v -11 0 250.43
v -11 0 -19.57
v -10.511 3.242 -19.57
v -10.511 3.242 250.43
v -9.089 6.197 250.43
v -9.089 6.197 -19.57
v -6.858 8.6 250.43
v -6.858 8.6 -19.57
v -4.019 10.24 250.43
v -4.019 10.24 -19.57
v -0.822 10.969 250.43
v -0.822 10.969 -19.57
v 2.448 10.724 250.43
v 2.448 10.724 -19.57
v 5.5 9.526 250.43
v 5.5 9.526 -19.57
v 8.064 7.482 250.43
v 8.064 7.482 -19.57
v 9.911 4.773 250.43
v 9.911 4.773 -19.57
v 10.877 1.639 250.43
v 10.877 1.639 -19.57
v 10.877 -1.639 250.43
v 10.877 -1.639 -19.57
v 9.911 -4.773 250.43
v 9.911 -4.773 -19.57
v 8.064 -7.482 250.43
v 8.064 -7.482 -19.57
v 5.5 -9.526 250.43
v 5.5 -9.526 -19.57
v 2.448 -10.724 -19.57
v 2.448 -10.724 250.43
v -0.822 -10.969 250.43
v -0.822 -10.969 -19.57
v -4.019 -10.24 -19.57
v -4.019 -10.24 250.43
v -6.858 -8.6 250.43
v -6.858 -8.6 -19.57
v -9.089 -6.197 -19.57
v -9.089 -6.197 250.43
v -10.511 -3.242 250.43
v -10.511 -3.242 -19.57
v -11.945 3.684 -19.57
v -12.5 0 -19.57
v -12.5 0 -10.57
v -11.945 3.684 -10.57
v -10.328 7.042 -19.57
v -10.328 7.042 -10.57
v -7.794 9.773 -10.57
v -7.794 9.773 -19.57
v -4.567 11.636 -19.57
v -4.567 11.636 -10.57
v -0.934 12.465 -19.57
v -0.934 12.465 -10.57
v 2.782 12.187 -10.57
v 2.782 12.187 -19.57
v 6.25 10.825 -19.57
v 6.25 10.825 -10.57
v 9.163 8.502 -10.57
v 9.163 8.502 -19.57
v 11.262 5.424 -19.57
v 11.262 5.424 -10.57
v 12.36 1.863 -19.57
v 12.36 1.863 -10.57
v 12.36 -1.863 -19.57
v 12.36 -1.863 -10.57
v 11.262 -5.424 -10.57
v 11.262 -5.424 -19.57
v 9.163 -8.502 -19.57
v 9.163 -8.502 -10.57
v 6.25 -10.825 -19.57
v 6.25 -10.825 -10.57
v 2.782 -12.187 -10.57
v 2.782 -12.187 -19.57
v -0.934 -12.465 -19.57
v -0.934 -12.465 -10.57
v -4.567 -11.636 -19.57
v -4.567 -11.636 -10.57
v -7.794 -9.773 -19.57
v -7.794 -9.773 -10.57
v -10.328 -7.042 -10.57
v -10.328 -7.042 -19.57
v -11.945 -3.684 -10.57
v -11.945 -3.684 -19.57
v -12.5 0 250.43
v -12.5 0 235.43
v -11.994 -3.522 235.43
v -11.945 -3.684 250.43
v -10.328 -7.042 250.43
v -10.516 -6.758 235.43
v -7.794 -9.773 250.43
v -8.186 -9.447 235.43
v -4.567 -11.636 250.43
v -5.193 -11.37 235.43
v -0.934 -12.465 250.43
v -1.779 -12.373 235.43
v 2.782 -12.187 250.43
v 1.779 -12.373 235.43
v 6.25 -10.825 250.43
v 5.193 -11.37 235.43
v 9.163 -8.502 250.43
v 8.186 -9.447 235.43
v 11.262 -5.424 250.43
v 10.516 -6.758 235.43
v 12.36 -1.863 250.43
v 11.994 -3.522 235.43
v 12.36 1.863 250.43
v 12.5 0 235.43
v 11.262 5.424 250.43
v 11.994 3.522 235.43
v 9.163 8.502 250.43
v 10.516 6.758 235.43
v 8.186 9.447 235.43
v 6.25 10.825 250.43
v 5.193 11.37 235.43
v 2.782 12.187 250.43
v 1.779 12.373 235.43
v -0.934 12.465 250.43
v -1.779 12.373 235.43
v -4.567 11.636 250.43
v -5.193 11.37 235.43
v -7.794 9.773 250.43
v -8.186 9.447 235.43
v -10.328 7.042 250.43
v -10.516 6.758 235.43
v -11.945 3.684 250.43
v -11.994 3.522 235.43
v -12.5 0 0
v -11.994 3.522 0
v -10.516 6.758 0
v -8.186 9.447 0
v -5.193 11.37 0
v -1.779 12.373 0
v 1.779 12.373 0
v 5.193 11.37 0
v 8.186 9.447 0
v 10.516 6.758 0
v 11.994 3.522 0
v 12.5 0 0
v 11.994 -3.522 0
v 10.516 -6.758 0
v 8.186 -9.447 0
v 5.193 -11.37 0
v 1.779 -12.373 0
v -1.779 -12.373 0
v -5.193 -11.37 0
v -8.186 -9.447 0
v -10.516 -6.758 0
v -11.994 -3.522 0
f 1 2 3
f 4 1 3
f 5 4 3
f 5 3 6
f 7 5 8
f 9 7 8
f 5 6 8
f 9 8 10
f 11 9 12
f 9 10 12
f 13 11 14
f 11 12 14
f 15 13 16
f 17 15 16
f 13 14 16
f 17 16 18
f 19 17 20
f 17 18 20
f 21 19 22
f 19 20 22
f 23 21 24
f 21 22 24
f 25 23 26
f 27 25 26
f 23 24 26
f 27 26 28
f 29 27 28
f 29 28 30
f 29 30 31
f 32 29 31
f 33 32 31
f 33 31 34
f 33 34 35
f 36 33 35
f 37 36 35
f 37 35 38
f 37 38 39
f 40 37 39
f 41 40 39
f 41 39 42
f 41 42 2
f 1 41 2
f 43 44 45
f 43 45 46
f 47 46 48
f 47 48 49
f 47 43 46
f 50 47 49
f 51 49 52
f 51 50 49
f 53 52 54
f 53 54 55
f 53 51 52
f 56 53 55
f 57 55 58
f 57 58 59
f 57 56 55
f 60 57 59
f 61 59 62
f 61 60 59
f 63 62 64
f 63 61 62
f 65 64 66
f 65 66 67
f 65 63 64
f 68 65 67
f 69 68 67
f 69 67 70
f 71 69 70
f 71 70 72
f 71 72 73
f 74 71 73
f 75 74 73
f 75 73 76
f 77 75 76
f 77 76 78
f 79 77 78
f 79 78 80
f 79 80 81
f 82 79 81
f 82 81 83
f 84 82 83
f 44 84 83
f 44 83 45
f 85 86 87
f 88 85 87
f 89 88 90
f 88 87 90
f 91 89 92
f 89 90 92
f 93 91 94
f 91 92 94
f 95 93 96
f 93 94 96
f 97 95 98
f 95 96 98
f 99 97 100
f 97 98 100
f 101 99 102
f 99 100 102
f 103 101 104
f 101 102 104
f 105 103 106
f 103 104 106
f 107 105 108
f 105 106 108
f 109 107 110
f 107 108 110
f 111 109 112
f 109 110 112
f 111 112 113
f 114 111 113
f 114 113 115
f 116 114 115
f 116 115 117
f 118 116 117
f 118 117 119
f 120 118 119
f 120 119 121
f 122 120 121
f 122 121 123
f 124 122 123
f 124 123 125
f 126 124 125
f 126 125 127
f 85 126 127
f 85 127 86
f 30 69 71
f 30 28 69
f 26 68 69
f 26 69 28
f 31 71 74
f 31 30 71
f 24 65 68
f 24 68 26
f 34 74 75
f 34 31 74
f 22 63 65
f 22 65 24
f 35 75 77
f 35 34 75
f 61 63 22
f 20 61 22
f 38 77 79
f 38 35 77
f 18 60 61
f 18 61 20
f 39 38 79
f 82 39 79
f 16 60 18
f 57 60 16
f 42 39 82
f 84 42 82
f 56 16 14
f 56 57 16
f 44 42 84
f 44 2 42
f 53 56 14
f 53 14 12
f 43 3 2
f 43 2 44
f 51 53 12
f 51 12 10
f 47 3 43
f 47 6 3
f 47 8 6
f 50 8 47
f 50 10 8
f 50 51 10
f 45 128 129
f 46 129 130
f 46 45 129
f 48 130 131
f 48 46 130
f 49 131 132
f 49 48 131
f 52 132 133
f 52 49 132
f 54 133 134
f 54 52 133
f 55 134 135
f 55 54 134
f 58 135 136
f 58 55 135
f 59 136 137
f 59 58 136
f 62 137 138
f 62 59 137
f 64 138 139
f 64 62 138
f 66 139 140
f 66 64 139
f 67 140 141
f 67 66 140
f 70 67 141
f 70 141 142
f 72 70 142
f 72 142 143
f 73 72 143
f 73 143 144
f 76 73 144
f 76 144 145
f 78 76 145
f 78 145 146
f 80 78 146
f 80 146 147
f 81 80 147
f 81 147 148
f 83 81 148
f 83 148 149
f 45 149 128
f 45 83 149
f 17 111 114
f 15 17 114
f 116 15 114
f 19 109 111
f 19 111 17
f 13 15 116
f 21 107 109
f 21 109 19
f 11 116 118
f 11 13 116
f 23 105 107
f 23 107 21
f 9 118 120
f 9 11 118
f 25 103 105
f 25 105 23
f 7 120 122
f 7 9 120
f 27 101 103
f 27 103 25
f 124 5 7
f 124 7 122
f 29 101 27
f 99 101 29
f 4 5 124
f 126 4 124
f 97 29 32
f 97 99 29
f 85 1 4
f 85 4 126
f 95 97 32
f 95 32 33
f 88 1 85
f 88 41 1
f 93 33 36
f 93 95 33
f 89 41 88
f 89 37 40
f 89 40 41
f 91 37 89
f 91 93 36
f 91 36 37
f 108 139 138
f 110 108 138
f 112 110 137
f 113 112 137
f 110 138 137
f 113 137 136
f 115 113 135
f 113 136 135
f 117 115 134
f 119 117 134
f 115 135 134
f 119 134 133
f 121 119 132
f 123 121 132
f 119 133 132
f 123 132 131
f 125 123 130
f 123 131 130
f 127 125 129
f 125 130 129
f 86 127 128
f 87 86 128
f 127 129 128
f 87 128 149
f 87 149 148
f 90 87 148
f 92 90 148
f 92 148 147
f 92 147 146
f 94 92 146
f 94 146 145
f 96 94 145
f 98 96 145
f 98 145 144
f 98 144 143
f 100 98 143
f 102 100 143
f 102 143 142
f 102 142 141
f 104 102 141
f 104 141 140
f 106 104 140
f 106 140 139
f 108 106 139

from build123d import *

# Parameters (mm, degrees)
SKETCH_1_R          = 12.5
EXTRUDE_2_DEPTH     = 235.43
SKETCH_2_R          = 9
CUT_EXTRUDE_1_DEPTH = 235.43
EXTRUDE_START       = 15.57
SKETCH_3_R          = 12.5
EXTRUDE_3_DEPTH     = 15.57
SKETCH_4_R          = 9
CUT_EXTRUDE_2_DEPTH = 20
EXTRUDE_START_2     = 9.93
SKETCH_5_R          = 12.5
EXTRUDE_4_DEPTH     = 9.93
SKETCH_6_R          = 9
CUT_EXTRUDE_3_DEPTH = 10
SKETCH_7_R          = 26.85848727
CUT_EXTRUDE_4_DEPTH = 14.93
SKETCH_8_R          = 12.5
EXTRUDE_5_DEPTH     = 9.93
SKETCH_9_R          = 9
CUT_EXTRUDE_5_DEPTH = 10
SKETCH_10_R         = 37.193394561
CUT_EXTRUDE_6_DEPTH = 0.22
SKETCH_11_R         = 43.187188263
CUT_EXTRUDE_7_DEPTH = 0.71
SKETCH_12_R         = 12.5
EXTRUDE_6_DEPTH     = 15
CUT_EXTRUDE_START   = -15
SKETCH_13_R         = 9
CUT_EXTRUDE_8_DEPTH = 15
SKETCH_14_R         = 11
CUT_EXTRUDE_9_DEPTH = 320


with BuildPart() as part:
    # 草图1 → 凸台-拉伸2 (new body)
    with BuildSketch(Plane.XY):
        Circle(SKETCH_1_R)
    extrude(amount=EXTRUDE_2_DEPTH)

    # 草图2 → 切除-拉伸1 (cut)
    with BuildSketch(Plane(origin=(0, 0, 0), x_dir=(-1, 0, 0), z_dir=(0, 0, -1))):
        Circle(SKETCH_2_R)
    extrude(amount=-CUT_EXTRUDE_1_DEPTH, mode=Mode.SUBTRACT)

    # 草图3 → 凸台-拉伸3 (add)
    with BuildSketch(Plane(origin=(0, 0, 0), x_dir=(-1, 0, 0), z_dir=(0, 0, -1)).offset(EXTRUDE_START)):
        Circle(SKETCH_3_R)
    extrude(amount=-EXTRUDE_3_DEPTH)

    # 草图4 → 切除-拉伸2 (cut)
    with BuildSketch(Plane(origin=(0, 0, -15.57), x_dir=(-1, 0, 0), z_dir=(0, 0, -1))):
        Circle(SKETCH_4_R)
    extrude(amount=-CUT_EXTRUDE_2_DEPTH, mode=Mode.SUBTRACT)

    # 草图5 → 凸台-拉伸4 (add)
    with BuildSketch(Plane(origin=(0, 0, -15.57), x_dir=(-1, 0, 0), z_dir=(0, 0, -1)).offset(EXTRUDE_START_2)):
        Circle(SKETCH_5_R)
    extrude(amount=-EXTRUDE_4_DEPTH)

    # 草图6 → 切除-拉伸3 (cut)
    with BuildSketch(Plane(origin=(0, 0, -25.5), x_dir=(-1, 0, 0), z_dir=(0, 0, -1))):
        Circle(SKETCH_6_R)
    extrude(amount=-CUT_EXTRUDE_3_DEPTH, mode=Mode.SUBTRACT)

    # 草图7 → 切除-拉伸4 (cut)
    with BuildSketch(Plane(origin=(0, 0, -25.5), x_dir=(-1, 0, 0), z_dir=(0, 0, -1))):
        Circle(SKETCH_7_R)
    extrude(amount=-CUT_EXTRUDE_4_DEPTH, mode=Mode.SUBTRACT)

    # 草图8 → 凸台-拉伸5 (add)
    with BuildSketch(Plane(origin=(0, 0, -10.57), x_dir=(-1, 0, 0), z_dir=(0, 0, -1)).offset(EXTRUDE_START_2)):
        Circle(SKETCH_8_R)
    extrude(amount=-EXTRUDE_5_DEPTH)

    # 草图9 → 切除-拉伸5 (cut)
    with BuildSketch(Plane(origin=(0, 0, -20.5), x_dir=(-1, 0, 0), z_dir=(0, 0, -1))):
        Circle(SKETCH_9_R)
    extrude(amount=-CUT_EXTRUDE_5_DEPTH, mode=Mode.SUBTRACT)

    # 草图10 → 切除-拉伸6 (cut)
    with BuildSketch(Plane(origin=(0, 0, -20.5), x_dir=(-1, 0, 0), z_dir=(0, 0, -1))):
        with Locations((7.201744855, 7.507888779)):
            Circle(SKETCH_10_R)
    extrude(amount=-CUT_EXTRUDE_6_DEPTH, mode=Mode.SUBTRACT)

    # 草图11 → 切除-拉伸7 (cut)
    with BuildSketch(Plane(origin=(0, 0, -20.28), x_dir=(-1, 0, 0), z_dir=(0, 0, -1))):
        with Locations((-1.225460352, 2.329416421)):
            Circle(SKETCH_11_R)
    extrude(amount=-CUT_EXTRUDE_7_DEPTH, mode=Mode.SUBTRACT)

    # 草图12 → 凸台-拉伸6 (add)
    with BuildSketch(Plane.XY.offset(235.43)):
        with Locations(Location((0, 0, 0), (0, 0, 180))):
            Circle(SKETCH_12_R)
    extrude(amount=EXTRUDE_6_DEPTH)

    # 草图13 → 切除-拉伸8 (cut)
    with BuildSketch(Plane.XY.offset(250.43).offset(CUT_EXTRUDE_START)):
        with Locations(Location((0, 0, 0), (0, 0, 180))):
            Circle(SKETCH_13_R)
    extrude(amount=CUT_EXTRUDE_8_DEPTH, mode=Mode.SUBTRACT)

    # 草图14 → 切除-拉伸9 (cut)
    with BuildSketch(Plane(origin=(0, 0, -19.57), x_dir=(-1, 0, 0), z_dir=(0, 0, -1))):
        Circle(SKETCH_14_R)
    extrude(amount=-CUT_EXTRUDE_9_DEPTH, mode=Mode.SUBTRACT)


solid = part.part
